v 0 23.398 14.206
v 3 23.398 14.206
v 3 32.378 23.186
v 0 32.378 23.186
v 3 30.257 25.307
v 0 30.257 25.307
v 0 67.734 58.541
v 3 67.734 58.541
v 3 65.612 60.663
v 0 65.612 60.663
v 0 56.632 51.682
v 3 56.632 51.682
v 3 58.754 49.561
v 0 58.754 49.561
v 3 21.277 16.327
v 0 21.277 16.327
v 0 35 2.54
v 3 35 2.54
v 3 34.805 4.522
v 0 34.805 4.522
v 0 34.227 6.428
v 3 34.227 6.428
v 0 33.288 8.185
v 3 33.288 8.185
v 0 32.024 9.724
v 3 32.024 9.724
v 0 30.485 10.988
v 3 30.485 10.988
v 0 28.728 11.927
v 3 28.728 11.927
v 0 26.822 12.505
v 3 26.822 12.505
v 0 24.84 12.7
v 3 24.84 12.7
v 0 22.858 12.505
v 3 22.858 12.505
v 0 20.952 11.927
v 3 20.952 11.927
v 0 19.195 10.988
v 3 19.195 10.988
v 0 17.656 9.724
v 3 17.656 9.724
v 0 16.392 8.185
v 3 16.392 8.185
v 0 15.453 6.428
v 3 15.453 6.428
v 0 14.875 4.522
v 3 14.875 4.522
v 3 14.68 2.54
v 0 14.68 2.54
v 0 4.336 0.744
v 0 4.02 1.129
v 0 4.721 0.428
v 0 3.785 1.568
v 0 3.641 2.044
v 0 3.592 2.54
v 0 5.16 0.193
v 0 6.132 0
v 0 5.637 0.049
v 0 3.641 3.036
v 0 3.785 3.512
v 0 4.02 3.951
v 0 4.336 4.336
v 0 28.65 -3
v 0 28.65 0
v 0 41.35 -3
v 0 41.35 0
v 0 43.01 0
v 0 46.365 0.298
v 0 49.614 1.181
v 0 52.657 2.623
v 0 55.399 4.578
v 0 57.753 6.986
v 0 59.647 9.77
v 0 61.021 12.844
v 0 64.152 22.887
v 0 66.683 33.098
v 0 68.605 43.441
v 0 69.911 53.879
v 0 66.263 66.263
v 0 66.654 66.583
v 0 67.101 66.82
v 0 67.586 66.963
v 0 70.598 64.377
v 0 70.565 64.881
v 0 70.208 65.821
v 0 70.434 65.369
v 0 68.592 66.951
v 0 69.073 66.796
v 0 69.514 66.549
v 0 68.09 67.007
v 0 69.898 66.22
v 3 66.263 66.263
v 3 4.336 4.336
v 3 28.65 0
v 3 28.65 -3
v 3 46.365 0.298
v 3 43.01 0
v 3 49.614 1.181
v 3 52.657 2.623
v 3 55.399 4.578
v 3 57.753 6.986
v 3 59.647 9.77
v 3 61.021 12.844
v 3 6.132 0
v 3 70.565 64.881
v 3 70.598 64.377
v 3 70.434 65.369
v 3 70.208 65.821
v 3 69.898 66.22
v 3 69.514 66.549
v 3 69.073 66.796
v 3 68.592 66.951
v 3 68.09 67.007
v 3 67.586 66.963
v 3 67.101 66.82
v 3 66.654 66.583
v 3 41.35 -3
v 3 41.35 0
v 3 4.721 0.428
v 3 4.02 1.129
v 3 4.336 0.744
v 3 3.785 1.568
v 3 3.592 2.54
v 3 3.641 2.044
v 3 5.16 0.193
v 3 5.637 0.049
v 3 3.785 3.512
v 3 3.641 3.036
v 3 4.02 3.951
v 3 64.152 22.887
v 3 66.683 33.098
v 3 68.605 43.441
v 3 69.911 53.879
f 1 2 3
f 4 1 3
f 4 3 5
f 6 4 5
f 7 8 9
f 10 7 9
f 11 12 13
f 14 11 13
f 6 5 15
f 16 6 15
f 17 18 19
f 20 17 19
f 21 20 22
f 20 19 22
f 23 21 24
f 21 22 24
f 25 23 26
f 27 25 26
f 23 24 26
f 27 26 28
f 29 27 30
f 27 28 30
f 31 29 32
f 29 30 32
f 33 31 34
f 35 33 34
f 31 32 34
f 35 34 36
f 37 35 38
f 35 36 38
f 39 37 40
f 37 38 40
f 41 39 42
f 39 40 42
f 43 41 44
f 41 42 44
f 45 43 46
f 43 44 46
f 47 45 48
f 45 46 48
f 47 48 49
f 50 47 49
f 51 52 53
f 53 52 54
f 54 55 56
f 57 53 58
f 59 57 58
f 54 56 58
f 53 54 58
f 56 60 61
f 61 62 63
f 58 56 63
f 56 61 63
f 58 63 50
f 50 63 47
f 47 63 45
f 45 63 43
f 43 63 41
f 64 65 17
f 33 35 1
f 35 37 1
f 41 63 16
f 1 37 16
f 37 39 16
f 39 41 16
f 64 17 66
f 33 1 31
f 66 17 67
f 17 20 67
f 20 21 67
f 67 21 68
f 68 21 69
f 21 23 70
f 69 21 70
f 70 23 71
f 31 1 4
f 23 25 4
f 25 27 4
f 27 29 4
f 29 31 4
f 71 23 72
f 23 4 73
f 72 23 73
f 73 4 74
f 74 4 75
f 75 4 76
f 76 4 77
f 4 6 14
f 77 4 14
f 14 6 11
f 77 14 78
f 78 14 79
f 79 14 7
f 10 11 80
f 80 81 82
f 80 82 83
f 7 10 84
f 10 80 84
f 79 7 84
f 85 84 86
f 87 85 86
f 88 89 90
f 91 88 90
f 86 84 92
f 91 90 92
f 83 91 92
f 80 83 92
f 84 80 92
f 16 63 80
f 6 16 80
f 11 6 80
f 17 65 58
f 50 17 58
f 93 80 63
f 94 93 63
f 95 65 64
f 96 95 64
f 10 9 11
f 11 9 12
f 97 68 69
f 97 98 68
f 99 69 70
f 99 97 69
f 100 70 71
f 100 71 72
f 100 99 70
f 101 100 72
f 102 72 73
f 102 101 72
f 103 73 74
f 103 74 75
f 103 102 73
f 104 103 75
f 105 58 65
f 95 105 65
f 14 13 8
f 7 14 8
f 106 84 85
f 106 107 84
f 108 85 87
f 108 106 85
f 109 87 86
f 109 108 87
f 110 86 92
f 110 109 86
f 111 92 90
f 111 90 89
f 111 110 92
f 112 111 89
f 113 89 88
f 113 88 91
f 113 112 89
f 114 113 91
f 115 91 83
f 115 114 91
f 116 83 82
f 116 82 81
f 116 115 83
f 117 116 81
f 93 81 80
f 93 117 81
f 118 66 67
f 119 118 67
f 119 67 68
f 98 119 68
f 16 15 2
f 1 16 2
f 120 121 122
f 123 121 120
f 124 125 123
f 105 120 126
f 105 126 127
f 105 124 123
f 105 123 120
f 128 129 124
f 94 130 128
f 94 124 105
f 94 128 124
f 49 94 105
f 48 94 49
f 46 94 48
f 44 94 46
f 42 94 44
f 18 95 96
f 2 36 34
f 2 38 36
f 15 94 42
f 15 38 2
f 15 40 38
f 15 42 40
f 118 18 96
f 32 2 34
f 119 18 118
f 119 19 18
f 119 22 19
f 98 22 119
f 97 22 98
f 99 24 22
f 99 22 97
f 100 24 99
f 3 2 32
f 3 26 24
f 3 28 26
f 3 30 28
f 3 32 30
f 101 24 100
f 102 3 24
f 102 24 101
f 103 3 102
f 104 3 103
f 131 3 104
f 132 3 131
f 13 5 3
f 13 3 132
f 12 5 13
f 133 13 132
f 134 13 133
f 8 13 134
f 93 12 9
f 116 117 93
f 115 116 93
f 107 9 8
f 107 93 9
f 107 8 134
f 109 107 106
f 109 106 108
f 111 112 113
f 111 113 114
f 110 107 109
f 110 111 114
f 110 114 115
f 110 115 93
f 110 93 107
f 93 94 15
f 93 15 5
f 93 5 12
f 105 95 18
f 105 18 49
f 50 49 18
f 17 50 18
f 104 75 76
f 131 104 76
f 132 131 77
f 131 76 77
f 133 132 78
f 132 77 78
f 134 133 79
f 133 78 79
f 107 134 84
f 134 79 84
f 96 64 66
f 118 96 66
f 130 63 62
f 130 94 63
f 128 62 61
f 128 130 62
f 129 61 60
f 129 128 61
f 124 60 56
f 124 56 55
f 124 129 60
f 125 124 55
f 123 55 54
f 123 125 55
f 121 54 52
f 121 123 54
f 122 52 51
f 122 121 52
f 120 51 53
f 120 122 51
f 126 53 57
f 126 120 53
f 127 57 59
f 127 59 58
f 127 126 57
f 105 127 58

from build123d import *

# Parameters (mm, degrees)
F1_DEPTH = 3
F2_R     = 19.05
F3_R     = 2.54
F5_DEPTH = 3
F7_DEPTH = 3


with BuildPart() as f1:
    # F0 (on Right) → F1 (new body)
    with BuildSketch(Plane.YZ):
        with BuildLine():
            Line((70.710678, 70.710678), (0, 0))
            Line((0, 0), (28.65, 0))
            Line((28.65, 0), (28.65, -3))
            Line((28.65, -3), (41.35, -3))
            Line((41.35, -3), (41.35, 0))
            Line((41.35, 0), (56.030339, 0))
            ThreePointArc((56.030339, 0), (67.001876, 34.601426), (70.710678, 70.710678))
        make_face()
    extrude(amount=F1_DEPTH)

    # F2
    f2_edges = [f1.edges().sort_by_distance(p)[0] for p in [
        (1.5, 56.030339, 0),
    ]]
    fillet(f2_edges, radius=F2_R)

    # F3
    f3_edges = [f1.edges().sort_by_distance(p)[0] for p in [
        (1.5, 70.710678, 70.710678),
        (1.5, 0, 0),
    ]]
    fillet(f3_edges, radius=F3_R)

    # F4 (on face) → F5 (cut, through all)
    with BuildSketch(Plane.YZ.offset(3)):
        Polygon((30.257099, 25.307352), (21.276843, 16.327096), (23.398163, 14.205775), (32.37842, 23.186031), align=None)
        Polygon((65.612438, 60.662691), (56.632182, 51.682435), (58.753502, 49.561114), (67.733759, 58.54137), align=None)
    extrude(amount=-F5_DEPTH, mode=Mode.SUBTRACT)

    # F6 (on face) → F7 (cut, through all)
    with BuildSketch(Plane.YZ.offset(3)):
        with BuildLine():
            Line((14.68, 2.54), (35, 2.54))
            ThreePointArc((35, 2.54), (24.84, 12.7), (14.68, 2.54))
        make_face()
    extrude(amount=-F7_DEPTH, mode=Mode.SUBTRACT)


solid = f1.part
